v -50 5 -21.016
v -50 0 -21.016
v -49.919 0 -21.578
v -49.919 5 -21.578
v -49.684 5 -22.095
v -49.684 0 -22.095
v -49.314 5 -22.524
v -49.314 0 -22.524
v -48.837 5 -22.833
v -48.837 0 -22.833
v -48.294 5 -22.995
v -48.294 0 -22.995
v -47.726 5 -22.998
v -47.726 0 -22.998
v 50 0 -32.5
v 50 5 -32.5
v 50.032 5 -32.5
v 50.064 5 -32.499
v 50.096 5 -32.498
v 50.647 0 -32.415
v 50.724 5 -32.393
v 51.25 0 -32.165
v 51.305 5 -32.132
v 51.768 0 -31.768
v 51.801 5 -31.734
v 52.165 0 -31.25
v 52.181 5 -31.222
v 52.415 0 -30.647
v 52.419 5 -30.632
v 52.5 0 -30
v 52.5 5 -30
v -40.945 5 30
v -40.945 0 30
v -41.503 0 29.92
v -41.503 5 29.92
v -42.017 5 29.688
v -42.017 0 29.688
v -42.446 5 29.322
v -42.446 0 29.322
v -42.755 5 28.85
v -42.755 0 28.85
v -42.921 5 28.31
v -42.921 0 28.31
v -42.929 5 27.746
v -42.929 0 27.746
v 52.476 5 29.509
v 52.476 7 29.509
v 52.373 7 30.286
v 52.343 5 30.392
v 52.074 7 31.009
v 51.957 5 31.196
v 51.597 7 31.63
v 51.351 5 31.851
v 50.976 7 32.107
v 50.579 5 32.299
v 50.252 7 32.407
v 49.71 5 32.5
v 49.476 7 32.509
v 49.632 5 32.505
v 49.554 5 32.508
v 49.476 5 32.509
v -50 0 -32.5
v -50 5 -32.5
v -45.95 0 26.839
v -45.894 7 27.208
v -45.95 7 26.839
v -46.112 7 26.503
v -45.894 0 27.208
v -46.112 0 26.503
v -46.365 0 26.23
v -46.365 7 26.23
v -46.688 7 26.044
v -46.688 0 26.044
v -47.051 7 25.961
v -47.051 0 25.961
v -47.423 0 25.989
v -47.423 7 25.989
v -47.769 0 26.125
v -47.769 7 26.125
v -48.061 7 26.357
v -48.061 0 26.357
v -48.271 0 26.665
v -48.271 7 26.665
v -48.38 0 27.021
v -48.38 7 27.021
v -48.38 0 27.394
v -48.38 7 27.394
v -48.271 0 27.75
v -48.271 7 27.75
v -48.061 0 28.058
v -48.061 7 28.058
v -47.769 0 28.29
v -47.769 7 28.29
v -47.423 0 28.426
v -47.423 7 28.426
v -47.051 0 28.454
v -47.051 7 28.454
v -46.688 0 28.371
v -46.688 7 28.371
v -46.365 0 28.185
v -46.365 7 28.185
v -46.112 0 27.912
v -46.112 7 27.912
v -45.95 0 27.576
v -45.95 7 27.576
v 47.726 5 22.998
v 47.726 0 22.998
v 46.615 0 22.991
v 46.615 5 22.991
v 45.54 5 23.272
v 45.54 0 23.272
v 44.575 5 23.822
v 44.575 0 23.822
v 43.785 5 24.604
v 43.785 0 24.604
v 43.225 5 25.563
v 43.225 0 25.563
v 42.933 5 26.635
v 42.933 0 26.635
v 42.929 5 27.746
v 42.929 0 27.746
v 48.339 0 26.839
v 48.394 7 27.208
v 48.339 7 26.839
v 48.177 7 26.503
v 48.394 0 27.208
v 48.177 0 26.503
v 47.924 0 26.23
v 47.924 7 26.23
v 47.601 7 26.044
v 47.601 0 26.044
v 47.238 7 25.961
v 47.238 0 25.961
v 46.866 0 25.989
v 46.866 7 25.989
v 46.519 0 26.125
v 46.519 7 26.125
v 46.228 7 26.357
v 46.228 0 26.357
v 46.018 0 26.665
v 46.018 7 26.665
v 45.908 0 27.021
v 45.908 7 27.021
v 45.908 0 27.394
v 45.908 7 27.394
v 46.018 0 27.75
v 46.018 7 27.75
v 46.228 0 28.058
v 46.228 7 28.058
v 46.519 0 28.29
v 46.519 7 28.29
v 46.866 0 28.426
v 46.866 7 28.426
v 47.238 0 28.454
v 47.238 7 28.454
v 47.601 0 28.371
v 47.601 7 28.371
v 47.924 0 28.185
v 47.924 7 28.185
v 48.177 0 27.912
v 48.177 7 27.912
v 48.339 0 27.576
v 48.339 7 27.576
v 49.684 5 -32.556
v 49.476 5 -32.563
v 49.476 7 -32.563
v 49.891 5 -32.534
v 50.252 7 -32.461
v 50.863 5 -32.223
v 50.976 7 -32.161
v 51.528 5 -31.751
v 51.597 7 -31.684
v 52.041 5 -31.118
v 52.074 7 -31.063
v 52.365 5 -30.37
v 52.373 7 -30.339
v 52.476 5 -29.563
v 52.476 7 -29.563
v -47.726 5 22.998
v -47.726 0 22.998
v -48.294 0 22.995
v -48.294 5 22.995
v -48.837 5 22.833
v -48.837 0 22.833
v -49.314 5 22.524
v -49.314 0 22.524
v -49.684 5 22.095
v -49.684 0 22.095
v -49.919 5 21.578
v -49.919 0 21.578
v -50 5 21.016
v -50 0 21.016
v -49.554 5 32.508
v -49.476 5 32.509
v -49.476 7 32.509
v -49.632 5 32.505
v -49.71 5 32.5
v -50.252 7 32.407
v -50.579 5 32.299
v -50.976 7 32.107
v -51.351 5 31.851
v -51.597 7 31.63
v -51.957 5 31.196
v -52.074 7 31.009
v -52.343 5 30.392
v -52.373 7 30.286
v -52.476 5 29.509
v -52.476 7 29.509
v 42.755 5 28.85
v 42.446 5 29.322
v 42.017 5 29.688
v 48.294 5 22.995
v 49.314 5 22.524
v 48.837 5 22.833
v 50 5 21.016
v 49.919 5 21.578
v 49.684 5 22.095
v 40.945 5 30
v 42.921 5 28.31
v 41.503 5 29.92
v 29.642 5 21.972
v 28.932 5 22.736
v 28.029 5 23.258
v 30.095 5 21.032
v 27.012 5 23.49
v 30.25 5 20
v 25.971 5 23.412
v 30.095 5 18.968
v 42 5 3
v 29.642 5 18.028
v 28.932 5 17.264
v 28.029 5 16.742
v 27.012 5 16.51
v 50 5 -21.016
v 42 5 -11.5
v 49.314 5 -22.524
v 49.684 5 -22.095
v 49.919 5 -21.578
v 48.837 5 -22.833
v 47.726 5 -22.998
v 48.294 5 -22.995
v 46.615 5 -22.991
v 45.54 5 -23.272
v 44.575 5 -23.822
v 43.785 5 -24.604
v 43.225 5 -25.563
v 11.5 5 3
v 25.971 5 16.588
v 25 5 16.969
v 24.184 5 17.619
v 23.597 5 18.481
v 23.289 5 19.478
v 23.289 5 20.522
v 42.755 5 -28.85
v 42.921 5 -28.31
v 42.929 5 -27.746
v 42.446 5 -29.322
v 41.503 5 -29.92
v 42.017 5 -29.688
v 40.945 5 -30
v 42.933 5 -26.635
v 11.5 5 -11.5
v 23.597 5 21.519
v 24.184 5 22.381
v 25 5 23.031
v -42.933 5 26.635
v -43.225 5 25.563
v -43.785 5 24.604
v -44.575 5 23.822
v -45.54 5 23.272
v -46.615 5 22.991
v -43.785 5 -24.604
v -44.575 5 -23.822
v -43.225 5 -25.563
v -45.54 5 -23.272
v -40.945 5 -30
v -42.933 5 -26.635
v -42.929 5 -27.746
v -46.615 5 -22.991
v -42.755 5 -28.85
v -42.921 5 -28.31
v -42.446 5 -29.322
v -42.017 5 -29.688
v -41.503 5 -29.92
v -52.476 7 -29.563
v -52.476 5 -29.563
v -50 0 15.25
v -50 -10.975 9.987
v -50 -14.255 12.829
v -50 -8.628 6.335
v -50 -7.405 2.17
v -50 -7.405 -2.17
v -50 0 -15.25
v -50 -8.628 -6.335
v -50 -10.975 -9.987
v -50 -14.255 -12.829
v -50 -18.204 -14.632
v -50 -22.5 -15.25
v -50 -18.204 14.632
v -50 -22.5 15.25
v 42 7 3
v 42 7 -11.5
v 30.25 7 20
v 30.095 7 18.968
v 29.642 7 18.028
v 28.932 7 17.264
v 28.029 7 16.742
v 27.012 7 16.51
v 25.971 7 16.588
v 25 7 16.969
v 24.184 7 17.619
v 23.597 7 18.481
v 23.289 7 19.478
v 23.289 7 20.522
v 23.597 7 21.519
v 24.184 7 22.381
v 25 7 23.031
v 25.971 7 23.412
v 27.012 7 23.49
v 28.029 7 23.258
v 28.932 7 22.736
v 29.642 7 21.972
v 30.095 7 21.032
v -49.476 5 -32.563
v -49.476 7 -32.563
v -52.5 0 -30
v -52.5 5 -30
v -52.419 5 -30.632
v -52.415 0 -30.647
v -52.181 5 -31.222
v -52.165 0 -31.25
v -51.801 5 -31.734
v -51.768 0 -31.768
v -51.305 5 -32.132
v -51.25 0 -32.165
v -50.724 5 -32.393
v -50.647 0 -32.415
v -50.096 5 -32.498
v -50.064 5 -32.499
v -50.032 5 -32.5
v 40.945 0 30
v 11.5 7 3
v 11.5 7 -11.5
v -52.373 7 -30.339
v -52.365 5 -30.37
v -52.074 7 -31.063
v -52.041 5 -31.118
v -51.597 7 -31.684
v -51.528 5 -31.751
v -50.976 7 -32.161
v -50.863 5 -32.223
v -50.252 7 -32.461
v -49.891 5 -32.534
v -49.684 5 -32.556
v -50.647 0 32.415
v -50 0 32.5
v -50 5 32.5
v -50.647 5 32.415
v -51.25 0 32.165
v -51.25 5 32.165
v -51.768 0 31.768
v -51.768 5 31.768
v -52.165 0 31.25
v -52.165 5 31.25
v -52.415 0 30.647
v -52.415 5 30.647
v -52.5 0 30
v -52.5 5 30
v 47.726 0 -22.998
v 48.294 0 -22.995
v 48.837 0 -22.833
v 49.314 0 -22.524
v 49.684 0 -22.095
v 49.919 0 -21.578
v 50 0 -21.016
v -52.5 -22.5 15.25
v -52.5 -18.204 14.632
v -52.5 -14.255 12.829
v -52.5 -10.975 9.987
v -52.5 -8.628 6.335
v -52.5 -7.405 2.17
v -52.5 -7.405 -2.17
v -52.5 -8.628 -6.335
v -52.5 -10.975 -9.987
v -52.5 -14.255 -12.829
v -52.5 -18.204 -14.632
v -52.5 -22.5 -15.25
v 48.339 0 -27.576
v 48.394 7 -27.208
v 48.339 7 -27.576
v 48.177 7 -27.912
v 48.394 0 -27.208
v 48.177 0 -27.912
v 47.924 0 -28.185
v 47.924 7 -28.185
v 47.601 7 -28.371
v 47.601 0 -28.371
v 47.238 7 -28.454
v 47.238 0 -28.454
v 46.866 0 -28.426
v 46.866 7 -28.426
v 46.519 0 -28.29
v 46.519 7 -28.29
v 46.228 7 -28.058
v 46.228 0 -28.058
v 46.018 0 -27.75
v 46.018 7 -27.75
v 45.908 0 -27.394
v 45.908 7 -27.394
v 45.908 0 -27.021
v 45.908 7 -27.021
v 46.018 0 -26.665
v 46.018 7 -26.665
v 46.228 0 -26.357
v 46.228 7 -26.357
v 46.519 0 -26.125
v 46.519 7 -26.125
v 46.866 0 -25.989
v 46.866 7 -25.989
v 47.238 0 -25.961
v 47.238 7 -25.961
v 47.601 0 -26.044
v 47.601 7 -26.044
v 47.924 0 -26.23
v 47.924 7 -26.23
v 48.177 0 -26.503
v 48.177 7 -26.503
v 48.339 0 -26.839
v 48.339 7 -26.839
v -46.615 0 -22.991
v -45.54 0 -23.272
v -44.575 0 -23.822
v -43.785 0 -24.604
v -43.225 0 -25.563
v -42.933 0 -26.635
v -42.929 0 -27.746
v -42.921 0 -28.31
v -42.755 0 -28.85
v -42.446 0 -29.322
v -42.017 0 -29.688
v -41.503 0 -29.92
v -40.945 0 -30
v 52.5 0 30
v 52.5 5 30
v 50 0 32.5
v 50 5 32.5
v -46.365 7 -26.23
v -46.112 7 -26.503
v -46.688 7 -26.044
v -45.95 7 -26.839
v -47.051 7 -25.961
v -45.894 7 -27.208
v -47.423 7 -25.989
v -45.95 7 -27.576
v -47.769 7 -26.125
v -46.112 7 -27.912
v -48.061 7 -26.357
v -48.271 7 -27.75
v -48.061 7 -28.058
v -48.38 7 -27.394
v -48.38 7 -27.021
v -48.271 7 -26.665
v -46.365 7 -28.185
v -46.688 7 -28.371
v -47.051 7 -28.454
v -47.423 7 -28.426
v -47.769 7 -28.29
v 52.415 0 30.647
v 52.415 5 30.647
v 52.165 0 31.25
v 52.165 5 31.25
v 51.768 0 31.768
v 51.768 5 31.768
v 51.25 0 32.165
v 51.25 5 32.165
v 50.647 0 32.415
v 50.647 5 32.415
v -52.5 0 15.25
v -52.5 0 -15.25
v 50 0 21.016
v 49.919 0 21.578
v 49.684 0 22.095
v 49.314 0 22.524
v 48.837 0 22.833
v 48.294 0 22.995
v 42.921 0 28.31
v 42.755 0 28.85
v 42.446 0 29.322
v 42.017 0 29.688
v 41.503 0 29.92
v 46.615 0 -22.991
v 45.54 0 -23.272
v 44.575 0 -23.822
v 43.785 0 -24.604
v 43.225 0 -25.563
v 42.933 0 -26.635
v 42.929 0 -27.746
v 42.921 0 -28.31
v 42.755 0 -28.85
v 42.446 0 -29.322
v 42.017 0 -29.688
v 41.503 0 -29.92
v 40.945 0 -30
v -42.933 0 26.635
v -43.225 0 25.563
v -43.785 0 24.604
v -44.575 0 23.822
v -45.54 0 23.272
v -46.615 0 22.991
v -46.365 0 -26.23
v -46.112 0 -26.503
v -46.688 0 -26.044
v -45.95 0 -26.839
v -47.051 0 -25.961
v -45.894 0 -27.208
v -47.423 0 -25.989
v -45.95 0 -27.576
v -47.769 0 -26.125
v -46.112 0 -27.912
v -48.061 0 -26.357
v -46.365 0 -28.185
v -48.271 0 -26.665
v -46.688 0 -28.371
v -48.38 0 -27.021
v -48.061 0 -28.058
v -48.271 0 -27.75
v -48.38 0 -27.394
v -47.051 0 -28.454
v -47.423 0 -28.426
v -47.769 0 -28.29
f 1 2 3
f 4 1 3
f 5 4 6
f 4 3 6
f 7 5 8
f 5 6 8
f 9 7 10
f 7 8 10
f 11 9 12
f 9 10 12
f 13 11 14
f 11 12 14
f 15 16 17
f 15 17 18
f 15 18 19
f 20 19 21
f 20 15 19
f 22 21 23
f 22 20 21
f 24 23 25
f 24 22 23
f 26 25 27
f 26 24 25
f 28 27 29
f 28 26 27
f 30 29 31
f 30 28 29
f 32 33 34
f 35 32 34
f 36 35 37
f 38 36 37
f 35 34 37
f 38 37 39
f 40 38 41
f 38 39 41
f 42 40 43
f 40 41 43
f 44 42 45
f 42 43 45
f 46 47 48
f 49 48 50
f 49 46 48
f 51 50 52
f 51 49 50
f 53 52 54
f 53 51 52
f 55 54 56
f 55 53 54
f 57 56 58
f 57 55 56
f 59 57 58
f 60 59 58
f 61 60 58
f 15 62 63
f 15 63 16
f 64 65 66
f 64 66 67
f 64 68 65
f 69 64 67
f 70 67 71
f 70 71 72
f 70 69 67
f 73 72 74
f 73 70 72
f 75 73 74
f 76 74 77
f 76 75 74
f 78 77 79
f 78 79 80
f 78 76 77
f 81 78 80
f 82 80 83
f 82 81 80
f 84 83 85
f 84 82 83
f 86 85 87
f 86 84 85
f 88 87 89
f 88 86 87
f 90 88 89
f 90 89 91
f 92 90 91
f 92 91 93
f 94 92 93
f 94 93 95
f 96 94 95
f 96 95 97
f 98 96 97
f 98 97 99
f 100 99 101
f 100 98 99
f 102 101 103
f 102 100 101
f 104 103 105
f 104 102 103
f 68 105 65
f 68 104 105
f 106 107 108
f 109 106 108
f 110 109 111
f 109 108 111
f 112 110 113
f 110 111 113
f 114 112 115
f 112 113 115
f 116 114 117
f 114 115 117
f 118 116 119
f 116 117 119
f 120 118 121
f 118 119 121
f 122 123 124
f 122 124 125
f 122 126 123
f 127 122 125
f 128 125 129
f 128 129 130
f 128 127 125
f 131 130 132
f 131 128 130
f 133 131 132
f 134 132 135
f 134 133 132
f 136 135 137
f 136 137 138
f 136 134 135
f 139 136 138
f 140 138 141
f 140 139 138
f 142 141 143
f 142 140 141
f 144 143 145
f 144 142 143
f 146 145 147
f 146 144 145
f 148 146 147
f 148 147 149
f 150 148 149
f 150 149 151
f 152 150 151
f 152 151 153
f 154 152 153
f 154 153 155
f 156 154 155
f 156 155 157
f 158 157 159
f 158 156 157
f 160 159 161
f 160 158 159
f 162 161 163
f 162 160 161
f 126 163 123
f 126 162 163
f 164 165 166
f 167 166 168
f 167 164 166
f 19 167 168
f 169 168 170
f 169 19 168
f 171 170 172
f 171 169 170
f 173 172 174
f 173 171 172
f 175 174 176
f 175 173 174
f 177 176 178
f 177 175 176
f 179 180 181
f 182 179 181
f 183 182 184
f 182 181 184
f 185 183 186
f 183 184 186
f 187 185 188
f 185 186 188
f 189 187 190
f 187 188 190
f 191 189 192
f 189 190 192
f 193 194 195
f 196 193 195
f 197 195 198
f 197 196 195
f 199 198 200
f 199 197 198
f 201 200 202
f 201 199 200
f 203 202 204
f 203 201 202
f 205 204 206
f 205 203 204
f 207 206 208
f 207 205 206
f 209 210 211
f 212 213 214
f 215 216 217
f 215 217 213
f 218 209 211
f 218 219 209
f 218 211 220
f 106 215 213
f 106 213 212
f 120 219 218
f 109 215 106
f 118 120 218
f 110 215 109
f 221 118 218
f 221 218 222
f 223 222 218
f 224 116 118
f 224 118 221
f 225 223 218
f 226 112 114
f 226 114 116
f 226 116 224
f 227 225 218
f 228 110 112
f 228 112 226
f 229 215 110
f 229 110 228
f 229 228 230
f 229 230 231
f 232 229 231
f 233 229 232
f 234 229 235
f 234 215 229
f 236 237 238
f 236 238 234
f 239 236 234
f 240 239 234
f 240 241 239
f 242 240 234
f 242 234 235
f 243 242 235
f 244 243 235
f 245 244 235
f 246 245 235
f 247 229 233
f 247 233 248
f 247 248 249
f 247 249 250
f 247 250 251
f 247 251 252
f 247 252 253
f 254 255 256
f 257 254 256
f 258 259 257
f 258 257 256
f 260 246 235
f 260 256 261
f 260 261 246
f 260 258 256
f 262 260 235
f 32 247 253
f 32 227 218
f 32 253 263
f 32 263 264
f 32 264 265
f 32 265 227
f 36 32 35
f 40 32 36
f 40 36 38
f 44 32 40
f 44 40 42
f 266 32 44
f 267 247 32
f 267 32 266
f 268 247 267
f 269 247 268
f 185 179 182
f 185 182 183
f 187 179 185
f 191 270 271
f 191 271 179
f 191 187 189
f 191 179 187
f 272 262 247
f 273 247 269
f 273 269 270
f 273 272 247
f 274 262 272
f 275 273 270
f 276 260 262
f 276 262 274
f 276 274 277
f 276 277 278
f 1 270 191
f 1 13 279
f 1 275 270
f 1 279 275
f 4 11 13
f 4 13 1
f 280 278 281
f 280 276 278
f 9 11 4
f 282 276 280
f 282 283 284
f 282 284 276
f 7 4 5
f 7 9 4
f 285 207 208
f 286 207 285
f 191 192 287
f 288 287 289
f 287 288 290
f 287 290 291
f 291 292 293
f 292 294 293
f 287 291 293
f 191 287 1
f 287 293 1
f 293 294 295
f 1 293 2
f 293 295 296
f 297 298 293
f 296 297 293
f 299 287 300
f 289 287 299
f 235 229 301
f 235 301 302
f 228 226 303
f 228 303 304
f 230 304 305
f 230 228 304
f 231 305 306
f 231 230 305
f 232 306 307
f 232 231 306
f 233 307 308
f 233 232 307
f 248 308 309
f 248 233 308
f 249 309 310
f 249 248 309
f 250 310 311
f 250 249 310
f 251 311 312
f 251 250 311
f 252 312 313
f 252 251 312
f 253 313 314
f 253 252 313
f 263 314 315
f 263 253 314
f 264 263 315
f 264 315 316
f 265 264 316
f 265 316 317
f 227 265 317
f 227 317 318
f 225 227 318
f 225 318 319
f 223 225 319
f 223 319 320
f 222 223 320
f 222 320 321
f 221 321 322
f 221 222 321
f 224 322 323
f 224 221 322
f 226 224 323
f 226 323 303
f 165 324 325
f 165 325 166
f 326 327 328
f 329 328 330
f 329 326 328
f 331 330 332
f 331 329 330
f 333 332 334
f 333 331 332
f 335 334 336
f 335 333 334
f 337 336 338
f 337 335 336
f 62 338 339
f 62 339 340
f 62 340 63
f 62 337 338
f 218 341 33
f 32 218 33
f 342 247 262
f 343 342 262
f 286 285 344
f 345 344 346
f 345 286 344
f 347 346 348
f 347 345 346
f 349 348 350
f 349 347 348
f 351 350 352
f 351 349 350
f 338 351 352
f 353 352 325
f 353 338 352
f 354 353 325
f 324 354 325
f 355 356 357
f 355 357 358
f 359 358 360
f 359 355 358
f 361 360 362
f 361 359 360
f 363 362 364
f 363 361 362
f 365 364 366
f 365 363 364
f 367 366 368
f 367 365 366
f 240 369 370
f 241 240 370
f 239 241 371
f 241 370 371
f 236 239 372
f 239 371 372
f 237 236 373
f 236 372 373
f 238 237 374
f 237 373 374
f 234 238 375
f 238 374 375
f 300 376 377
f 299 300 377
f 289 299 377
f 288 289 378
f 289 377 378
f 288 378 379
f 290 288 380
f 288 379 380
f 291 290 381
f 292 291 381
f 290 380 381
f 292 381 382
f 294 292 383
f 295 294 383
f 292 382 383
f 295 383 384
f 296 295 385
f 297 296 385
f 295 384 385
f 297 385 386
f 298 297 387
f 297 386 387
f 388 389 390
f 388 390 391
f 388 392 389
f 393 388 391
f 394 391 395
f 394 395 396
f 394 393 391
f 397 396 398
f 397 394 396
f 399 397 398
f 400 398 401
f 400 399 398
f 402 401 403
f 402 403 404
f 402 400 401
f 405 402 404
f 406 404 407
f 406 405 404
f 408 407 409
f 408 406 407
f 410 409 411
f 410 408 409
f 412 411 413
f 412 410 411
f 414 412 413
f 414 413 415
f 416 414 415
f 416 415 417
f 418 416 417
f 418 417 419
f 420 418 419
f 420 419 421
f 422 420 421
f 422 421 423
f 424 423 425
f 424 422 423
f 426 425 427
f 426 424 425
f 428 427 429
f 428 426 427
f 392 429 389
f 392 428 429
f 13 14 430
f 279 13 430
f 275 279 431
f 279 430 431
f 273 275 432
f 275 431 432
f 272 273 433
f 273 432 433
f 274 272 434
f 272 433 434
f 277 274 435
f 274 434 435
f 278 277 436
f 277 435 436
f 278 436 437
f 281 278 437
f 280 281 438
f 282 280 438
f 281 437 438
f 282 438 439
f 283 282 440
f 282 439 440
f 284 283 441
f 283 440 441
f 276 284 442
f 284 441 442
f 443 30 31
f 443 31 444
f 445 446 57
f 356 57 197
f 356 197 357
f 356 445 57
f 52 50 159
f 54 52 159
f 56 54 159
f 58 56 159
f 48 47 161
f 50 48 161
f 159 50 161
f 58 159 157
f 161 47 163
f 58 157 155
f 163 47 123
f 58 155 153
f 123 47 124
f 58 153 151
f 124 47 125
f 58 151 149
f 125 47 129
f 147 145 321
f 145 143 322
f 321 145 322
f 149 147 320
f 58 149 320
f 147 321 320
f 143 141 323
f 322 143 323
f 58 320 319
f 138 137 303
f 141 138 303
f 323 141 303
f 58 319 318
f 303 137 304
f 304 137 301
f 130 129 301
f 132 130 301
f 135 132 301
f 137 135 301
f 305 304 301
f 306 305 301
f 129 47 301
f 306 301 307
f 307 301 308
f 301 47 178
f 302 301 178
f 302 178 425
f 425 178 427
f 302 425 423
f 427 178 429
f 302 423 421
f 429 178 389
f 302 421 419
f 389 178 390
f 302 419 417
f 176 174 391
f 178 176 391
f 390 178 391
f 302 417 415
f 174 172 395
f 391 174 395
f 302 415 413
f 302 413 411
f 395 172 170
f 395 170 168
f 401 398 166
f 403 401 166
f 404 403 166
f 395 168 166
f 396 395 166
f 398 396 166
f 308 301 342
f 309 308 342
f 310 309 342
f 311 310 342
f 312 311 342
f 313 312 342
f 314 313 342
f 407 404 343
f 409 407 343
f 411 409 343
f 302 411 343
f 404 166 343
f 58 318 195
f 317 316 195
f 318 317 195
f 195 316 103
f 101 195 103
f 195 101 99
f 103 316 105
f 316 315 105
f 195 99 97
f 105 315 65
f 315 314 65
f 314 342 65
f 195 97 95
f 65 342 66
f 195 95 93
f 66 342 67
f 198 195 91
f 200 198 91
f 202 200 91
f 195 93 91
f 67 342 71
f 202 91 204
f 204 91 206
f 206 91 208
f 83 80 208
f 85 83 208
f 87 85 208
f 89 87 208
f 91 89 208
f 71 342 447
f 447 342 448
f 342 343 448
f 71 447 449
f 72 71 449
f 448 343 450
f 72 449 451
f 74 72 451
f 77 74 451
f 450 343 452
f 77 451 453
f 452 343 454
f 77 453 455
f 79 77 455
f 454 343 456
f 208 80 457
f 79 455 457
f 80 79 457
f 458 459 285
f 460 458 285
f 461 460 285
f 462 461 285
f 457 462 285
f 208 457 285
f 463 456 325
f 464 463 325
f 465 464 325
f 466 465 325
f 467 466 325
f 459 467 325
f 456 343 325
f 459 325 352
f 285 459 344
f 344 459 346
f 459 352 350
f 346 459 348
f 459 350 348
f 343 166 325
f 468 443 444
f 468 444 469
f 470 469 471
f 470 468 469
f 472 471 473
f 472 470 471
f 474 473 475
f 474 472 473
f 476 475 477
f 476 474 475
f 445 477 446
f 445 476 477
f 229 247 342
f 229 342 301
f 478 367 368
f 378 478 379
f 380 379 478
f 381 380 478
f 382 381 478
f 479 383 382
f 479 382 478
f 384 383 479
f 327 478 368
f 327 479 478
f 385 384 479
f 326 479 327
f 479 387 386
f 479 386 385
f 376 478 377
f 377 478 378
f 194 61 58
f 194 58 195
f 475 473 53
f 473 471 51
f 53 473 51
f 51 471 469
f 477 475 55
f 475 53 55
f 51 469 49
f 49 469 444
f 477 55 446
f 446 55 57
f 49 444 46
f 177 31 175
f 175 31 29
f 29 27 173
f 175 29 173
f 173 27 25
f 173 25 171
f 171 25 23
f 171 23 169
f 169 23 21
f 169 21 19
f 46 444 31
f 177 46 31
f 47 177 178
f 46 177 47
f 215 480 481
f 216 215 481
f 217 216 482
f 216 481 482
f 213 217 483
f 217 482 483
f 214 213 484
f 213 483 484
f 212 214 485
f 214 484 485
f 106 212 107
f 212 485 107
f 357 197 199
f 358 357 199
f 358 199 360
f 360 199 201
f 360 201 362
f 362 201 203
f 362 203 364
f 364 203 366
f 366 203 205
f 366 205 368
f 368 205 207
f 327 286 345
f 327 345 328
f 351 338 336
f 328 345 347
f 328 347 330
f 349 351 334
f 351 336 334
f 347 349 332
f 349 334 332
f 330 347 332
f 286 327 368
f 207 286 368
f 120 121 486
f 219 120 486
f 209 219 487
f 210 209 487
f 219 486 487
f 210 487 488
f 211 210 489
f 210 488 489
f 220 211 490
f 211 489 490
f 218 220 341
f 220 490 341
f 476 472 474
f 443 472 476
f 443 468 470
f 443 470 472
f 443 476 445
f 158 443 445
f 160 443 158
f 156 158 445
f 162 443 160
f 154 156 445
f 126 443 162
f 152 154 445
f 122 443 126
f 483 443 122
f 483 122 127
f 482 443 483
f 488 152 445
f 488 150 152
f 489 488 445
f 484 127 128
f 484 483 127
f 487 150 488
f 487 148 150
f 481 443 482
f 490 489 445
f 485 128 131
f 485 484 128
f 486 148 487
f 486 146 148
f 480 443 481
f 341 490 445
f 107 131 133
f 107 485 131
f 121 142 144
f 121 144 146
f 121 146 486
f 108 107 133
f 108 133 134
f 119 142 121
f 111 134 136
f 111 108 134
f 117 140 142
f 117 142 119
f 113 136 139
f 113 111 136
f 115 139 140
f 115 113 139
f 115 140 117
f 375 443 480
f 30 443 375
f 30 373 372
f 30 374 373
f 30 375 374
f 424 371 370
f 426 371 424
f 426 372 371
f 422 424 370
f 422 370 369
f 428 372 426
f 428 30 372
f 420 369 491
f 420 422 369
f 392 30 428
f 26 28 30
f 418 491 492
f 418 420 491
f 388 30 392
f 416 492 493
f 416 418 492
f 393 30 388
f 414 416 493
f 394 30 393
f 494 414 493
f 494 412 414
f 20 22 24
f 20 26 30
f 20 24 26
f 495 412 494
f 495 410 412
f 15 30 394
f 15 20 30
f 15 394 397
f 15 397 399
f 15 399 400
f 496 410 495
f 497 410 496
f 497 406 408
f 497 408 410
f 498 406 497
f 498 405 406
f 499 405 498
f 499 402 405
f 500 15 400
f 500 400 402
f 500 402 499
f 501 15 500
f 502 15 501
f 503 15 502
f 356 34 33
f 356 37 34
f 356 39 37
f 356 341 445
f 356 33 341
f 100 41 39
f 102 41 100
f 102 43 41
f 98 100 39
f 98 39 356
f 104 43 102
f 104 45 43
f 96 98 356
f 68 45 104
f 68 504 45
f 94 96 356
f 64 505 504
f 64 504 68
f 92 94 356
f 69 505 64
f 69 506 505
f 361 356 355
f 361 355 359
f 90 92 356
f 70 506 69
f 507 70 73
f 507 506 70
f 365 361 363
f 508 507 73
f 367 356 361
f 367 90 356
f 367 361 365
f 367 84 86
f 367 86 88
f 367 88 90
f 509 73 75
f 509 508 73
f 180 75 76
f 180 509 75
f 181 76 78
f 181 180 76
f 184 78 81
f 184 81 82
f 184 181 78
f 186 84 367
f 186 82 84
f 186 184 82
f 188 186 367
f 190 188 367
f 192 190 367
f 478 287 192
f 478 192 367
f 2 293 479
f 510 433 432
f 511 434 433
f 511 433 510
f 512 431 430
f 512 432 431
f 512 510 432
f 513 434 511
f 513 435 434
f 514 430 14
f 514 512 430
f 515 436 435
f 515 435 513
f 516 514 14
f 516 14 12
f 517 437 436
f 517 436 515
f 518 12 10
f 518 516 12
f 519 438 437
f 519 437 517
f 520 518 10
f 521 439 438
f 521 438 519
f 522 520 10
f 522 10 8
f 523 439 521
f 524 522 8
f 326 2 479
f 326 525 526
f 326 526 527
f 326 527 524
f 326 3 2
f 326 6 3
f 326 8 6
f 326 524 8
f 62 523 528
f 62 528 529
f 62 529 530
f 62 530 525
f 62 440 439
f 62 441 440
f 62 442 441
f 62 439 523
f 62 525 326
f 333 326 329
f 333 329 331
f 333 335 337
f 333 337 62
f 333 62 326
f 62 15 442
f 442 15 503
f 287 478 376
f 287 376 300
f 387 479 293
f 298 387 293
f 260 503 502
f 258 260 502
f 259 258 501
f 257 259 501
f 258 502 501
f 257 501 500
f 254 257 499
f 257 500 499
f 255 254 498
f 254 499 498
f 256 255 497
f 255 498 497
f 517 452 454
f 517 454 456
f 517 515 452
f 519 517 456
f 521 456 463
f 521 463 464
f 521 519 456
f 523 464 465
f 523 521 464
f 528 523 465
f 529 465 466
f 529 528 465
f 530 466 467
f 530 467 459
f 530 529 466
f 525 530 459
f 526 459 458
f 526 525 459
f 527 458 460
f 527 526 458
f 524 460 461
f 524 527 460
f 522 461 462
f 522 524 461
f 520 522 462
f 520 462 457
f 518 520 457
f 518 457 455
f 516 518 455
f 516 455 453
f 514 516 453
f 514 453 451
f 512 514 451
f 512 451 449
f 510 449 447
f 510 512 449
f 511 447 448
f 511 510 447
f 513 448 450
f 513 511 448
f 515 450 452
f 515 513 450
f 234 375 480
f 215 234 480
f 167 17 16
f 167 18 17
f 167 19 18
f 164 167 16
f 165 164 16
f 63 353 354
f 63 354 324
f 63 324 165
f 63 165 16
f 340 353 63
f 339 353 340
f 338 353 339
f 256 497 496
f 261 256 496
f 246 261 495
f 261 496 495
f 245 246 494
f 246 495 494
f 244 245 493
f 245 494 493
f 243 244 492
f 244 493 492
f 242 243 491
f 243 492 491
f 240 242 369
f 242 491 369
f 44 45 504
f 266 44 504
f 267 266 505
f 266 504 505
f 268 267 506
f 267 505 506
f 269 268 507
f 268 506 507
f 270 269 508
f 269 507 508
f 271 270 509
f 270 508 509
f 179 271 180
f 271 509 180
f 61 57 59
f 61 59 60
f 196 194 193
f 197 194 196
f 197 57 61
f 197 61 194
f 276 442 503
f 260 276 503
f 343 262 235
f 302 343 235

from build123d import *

# Parameters (mm, degrees)
SKETCH_1_R          = 1.25
EXTRUDE_1_DEPTH     = 5
SKETCH_2_W          = 2.5
SKETCH_2_H          = 30.5
EXTRUDE_2_DEPTH     = 22.5
CUT_EXTRUDE_1_REACH = 107
SKETCH_4_R          = 3.5
SKETCH_4_R_2        = 1.25
SKETCH_4_W          = 30.5
SKETCH_4_H          = 14.5
EXTRUDE_3_DEPTH     = 2


with BuildPart() as part:
    # Эскиз1 → Бобышка-Вытянуть1 (new body)
    with BuildSketch(Plane(origin=(0, 0, 0), x_dir=(1, 0, 0), z_dir=(0, 1, 0))):
        with BuildLine():
            Line((-50, 32.5), (50, 32.5))
            ThreePointArc((50, 32.5), (51.767766953, 31.767766953), (52.5, 30))
            Line((52.5, 30), (52.5, -30))
            ThreePointArc((52.5, -30), (51.767766953, -31.767766953), (50, -32.5))
            Line((50, -32.5), (-50, -32.5))
            ThreePointArc((-50, -32.5), (-51.767766953, -31.767766953), (-52.5, -30))
            Line((-52.5, -30), (-52.5, -27.5))
            Line((-52.5, -27.5), (-52.5, 27.5))
            Line((-52.5, 27.5), (-52.5, 30))
            ThreePointArc((-52.5, 30), (-51.767766953, 31.767766953), (-50, 32.5))
        make_face()
        with Locations((-47.144457485, 27.207649218)):
            Circle(SKETCH_1_R, mode=Mode.SUBTRACT)
        with Locations((47.144457485, -27.207649218)):
            Circle(SKETCH_1_R, mode=Mode.SUBTRACT)
        with Locations((47.144457485, 27.207649218)):
            Circle(SKETCH_1_R, mode=Mode.SUBTRACT)
        with Locations((-47.144457485, -27.207649218)):
            Circle(SKETCH_1_R, mode=Mode.SUBTRACT)
        with BuildLine():
            Line((-40.944886513, 30), (40.944886513, 30))
            ThreePointArc((40.944886513, 30), (42.446070129, 29.321532349), (42.928749224, 27.74644775))
            ThreePointArc((42.928749224, 27.74644775), (44.154618836, 24.187158388), (47.726226395, 22.997655757))
            ThreePointArc((47.726226395, 22.997655757), (49.313859351, 22.524386076), (50, 21.016482364))
            Line((50, 21.016482364), (50, -21.016482364))
            ThreePointArc((50, -21.016482364), (49.313859351, -22.524386076), (47.726226395, -22.997655757))
            ThreePointArc((47.726226395, -22.997655757), (44.154618836, -24.187158388), (42.928749224, -27.74644775))
            ThreePointArc((42.928749224, -27.74644775), (42.446070129, -29.321532349), (40.944886513, -30))
            Line((40.944886513, -30), (-40.944886513, -30))
            ThreePointArc((-40.944886513, -30), (-42.446070129, -29.321532349), (-42.928749224, -27.74644775))
            ThreePointArc((-42.928749224, -27.74644775), (-44.154618836, -24.187158388), (-47.726226395, -22.997655757))
            ThreePointArc((-47.726226395, -22.997655757), (-49.313859351, -22.524386076), (-50, -21.016482364))
            Line((-50, -21.016482364), (-50, 21.016482364))
            ThreePointArc((-50, 21.016482364), (-49.313859351, 22.524386076), (-47.726226395, 22.997655757))
            ThreePointArc((-47.726226395, 22.997655757), (-44.154618836, 24.187158388), (-42.928749224, 27.74644775))
            ThreePointArc((-42.928749224, 27.74644775), (-42.446070129, 29.321532349), (-40.944886513, 30))
        make_face(mode=Mode.SUBTRACT)
    extrude(amount=EXTRUDE_1_DEPTH)

    # Эскиз2 → Бобышка-Вытянуть2 (add)
    with BuildSketch(Plane.XZ):
        with Locations((-51.25, 0)):
            Rectangle(SKETCH_2_W, SKETCH_2_H)
    extrude(amount=EXTRUDE_2_DEPTH)

    # Эскиз3 → Вырез-Вытянуть1 (cut, up to next)
    with BuildSketch(Plane.ZY.offset(52.5), mode=Mode.PRIVATE) as cut_extrude_1_sk1:
        with BuildLine():
            Line((-15.25, -22.5), (15.25, -22.5))
            ThreePointArc((15.25, -22.5), (0, -7.25), (-15.25, -22.5))
        make_face()
    cut_extrude_1_tool1 = extrude(cut_extrude_1_sk1.sketch, amount=-CUT_EXTRUDE_1_REACH, mode=Mode.PRIVATE) & part.part
    add(cut_extrude_1_tool1.solids().sort_by_distance((-52.5, -16.027699, 0))[0], mode=Mode.SUBTRACT)

    # Эскиз4 → Бобышка-Вытянуть3 (add)
    with BuildSketch(Plane(origin=(0, 5, 0), x_dir=(1, 0, 0), z_dir=(0, 1, 0))):
        with BuildLine():
            Line((-49.4756814, 32.562921498), (49.4756814, 32.562921498))
            ThreePointArc((49.4756814, 32.562921498), (51.597001743, 31.684241842), (52.4756814, 29.562921498))
            Line((52.4756814, 29.562921498), (52.4756814, -29.509131029))
            ThreePointArc((52.4756814, -29.509131029), (51.597001743, -31.630451373), (49.4756814, -32.509131029))
            Line((49.4756814, -32.509131029), (-49.4756814, -32.509131029))
            ThreePointArc((-49.4756814, -32.509131029), (-51.597001743, -31.630451373), (-52.4756814, -29.509131029))
            Line((-52.4756814, -29.509131029), (-52.4756814, 29.562921498))
            ThreePointArc((-52.4756814, 29.562921498), (-51.597001743, 31.684241842), (-49.4756814, 32.562921498))
        make_face()
        with Locations((26.75, -20)):
            Circle(SKETCH_4_R, mode=Mode.SUBTRACT)
        with Locations((-47.144457485, 27.207649218)):
            Circle(SKETCH_4_R_2, mode=Mode.SUBTRACT)
        with Locations((47.144457485, 27.207649218)):
            Circle(SKETCH_4_R_2, mode=Mode.SUBTRACT)
        with Locations((47.144457485, -27.207649218)):
            Circle(SKETCH_4_R_2, mode=Mode.SUBTRACT)
        with Locations((-47.144457485, -27.207649218)):
            Circle(SKETCH_4_R_2, mode=Mode.SUBTRACT)
        with Locations((26.75, 4.25)):
            Rectangle(SKETCH_4_W, SKETCH_4_H, mode=Mode.SUBTRACT)
    extrude(amount=EXTRUDE_3_DEPTH)


solid = part.part
